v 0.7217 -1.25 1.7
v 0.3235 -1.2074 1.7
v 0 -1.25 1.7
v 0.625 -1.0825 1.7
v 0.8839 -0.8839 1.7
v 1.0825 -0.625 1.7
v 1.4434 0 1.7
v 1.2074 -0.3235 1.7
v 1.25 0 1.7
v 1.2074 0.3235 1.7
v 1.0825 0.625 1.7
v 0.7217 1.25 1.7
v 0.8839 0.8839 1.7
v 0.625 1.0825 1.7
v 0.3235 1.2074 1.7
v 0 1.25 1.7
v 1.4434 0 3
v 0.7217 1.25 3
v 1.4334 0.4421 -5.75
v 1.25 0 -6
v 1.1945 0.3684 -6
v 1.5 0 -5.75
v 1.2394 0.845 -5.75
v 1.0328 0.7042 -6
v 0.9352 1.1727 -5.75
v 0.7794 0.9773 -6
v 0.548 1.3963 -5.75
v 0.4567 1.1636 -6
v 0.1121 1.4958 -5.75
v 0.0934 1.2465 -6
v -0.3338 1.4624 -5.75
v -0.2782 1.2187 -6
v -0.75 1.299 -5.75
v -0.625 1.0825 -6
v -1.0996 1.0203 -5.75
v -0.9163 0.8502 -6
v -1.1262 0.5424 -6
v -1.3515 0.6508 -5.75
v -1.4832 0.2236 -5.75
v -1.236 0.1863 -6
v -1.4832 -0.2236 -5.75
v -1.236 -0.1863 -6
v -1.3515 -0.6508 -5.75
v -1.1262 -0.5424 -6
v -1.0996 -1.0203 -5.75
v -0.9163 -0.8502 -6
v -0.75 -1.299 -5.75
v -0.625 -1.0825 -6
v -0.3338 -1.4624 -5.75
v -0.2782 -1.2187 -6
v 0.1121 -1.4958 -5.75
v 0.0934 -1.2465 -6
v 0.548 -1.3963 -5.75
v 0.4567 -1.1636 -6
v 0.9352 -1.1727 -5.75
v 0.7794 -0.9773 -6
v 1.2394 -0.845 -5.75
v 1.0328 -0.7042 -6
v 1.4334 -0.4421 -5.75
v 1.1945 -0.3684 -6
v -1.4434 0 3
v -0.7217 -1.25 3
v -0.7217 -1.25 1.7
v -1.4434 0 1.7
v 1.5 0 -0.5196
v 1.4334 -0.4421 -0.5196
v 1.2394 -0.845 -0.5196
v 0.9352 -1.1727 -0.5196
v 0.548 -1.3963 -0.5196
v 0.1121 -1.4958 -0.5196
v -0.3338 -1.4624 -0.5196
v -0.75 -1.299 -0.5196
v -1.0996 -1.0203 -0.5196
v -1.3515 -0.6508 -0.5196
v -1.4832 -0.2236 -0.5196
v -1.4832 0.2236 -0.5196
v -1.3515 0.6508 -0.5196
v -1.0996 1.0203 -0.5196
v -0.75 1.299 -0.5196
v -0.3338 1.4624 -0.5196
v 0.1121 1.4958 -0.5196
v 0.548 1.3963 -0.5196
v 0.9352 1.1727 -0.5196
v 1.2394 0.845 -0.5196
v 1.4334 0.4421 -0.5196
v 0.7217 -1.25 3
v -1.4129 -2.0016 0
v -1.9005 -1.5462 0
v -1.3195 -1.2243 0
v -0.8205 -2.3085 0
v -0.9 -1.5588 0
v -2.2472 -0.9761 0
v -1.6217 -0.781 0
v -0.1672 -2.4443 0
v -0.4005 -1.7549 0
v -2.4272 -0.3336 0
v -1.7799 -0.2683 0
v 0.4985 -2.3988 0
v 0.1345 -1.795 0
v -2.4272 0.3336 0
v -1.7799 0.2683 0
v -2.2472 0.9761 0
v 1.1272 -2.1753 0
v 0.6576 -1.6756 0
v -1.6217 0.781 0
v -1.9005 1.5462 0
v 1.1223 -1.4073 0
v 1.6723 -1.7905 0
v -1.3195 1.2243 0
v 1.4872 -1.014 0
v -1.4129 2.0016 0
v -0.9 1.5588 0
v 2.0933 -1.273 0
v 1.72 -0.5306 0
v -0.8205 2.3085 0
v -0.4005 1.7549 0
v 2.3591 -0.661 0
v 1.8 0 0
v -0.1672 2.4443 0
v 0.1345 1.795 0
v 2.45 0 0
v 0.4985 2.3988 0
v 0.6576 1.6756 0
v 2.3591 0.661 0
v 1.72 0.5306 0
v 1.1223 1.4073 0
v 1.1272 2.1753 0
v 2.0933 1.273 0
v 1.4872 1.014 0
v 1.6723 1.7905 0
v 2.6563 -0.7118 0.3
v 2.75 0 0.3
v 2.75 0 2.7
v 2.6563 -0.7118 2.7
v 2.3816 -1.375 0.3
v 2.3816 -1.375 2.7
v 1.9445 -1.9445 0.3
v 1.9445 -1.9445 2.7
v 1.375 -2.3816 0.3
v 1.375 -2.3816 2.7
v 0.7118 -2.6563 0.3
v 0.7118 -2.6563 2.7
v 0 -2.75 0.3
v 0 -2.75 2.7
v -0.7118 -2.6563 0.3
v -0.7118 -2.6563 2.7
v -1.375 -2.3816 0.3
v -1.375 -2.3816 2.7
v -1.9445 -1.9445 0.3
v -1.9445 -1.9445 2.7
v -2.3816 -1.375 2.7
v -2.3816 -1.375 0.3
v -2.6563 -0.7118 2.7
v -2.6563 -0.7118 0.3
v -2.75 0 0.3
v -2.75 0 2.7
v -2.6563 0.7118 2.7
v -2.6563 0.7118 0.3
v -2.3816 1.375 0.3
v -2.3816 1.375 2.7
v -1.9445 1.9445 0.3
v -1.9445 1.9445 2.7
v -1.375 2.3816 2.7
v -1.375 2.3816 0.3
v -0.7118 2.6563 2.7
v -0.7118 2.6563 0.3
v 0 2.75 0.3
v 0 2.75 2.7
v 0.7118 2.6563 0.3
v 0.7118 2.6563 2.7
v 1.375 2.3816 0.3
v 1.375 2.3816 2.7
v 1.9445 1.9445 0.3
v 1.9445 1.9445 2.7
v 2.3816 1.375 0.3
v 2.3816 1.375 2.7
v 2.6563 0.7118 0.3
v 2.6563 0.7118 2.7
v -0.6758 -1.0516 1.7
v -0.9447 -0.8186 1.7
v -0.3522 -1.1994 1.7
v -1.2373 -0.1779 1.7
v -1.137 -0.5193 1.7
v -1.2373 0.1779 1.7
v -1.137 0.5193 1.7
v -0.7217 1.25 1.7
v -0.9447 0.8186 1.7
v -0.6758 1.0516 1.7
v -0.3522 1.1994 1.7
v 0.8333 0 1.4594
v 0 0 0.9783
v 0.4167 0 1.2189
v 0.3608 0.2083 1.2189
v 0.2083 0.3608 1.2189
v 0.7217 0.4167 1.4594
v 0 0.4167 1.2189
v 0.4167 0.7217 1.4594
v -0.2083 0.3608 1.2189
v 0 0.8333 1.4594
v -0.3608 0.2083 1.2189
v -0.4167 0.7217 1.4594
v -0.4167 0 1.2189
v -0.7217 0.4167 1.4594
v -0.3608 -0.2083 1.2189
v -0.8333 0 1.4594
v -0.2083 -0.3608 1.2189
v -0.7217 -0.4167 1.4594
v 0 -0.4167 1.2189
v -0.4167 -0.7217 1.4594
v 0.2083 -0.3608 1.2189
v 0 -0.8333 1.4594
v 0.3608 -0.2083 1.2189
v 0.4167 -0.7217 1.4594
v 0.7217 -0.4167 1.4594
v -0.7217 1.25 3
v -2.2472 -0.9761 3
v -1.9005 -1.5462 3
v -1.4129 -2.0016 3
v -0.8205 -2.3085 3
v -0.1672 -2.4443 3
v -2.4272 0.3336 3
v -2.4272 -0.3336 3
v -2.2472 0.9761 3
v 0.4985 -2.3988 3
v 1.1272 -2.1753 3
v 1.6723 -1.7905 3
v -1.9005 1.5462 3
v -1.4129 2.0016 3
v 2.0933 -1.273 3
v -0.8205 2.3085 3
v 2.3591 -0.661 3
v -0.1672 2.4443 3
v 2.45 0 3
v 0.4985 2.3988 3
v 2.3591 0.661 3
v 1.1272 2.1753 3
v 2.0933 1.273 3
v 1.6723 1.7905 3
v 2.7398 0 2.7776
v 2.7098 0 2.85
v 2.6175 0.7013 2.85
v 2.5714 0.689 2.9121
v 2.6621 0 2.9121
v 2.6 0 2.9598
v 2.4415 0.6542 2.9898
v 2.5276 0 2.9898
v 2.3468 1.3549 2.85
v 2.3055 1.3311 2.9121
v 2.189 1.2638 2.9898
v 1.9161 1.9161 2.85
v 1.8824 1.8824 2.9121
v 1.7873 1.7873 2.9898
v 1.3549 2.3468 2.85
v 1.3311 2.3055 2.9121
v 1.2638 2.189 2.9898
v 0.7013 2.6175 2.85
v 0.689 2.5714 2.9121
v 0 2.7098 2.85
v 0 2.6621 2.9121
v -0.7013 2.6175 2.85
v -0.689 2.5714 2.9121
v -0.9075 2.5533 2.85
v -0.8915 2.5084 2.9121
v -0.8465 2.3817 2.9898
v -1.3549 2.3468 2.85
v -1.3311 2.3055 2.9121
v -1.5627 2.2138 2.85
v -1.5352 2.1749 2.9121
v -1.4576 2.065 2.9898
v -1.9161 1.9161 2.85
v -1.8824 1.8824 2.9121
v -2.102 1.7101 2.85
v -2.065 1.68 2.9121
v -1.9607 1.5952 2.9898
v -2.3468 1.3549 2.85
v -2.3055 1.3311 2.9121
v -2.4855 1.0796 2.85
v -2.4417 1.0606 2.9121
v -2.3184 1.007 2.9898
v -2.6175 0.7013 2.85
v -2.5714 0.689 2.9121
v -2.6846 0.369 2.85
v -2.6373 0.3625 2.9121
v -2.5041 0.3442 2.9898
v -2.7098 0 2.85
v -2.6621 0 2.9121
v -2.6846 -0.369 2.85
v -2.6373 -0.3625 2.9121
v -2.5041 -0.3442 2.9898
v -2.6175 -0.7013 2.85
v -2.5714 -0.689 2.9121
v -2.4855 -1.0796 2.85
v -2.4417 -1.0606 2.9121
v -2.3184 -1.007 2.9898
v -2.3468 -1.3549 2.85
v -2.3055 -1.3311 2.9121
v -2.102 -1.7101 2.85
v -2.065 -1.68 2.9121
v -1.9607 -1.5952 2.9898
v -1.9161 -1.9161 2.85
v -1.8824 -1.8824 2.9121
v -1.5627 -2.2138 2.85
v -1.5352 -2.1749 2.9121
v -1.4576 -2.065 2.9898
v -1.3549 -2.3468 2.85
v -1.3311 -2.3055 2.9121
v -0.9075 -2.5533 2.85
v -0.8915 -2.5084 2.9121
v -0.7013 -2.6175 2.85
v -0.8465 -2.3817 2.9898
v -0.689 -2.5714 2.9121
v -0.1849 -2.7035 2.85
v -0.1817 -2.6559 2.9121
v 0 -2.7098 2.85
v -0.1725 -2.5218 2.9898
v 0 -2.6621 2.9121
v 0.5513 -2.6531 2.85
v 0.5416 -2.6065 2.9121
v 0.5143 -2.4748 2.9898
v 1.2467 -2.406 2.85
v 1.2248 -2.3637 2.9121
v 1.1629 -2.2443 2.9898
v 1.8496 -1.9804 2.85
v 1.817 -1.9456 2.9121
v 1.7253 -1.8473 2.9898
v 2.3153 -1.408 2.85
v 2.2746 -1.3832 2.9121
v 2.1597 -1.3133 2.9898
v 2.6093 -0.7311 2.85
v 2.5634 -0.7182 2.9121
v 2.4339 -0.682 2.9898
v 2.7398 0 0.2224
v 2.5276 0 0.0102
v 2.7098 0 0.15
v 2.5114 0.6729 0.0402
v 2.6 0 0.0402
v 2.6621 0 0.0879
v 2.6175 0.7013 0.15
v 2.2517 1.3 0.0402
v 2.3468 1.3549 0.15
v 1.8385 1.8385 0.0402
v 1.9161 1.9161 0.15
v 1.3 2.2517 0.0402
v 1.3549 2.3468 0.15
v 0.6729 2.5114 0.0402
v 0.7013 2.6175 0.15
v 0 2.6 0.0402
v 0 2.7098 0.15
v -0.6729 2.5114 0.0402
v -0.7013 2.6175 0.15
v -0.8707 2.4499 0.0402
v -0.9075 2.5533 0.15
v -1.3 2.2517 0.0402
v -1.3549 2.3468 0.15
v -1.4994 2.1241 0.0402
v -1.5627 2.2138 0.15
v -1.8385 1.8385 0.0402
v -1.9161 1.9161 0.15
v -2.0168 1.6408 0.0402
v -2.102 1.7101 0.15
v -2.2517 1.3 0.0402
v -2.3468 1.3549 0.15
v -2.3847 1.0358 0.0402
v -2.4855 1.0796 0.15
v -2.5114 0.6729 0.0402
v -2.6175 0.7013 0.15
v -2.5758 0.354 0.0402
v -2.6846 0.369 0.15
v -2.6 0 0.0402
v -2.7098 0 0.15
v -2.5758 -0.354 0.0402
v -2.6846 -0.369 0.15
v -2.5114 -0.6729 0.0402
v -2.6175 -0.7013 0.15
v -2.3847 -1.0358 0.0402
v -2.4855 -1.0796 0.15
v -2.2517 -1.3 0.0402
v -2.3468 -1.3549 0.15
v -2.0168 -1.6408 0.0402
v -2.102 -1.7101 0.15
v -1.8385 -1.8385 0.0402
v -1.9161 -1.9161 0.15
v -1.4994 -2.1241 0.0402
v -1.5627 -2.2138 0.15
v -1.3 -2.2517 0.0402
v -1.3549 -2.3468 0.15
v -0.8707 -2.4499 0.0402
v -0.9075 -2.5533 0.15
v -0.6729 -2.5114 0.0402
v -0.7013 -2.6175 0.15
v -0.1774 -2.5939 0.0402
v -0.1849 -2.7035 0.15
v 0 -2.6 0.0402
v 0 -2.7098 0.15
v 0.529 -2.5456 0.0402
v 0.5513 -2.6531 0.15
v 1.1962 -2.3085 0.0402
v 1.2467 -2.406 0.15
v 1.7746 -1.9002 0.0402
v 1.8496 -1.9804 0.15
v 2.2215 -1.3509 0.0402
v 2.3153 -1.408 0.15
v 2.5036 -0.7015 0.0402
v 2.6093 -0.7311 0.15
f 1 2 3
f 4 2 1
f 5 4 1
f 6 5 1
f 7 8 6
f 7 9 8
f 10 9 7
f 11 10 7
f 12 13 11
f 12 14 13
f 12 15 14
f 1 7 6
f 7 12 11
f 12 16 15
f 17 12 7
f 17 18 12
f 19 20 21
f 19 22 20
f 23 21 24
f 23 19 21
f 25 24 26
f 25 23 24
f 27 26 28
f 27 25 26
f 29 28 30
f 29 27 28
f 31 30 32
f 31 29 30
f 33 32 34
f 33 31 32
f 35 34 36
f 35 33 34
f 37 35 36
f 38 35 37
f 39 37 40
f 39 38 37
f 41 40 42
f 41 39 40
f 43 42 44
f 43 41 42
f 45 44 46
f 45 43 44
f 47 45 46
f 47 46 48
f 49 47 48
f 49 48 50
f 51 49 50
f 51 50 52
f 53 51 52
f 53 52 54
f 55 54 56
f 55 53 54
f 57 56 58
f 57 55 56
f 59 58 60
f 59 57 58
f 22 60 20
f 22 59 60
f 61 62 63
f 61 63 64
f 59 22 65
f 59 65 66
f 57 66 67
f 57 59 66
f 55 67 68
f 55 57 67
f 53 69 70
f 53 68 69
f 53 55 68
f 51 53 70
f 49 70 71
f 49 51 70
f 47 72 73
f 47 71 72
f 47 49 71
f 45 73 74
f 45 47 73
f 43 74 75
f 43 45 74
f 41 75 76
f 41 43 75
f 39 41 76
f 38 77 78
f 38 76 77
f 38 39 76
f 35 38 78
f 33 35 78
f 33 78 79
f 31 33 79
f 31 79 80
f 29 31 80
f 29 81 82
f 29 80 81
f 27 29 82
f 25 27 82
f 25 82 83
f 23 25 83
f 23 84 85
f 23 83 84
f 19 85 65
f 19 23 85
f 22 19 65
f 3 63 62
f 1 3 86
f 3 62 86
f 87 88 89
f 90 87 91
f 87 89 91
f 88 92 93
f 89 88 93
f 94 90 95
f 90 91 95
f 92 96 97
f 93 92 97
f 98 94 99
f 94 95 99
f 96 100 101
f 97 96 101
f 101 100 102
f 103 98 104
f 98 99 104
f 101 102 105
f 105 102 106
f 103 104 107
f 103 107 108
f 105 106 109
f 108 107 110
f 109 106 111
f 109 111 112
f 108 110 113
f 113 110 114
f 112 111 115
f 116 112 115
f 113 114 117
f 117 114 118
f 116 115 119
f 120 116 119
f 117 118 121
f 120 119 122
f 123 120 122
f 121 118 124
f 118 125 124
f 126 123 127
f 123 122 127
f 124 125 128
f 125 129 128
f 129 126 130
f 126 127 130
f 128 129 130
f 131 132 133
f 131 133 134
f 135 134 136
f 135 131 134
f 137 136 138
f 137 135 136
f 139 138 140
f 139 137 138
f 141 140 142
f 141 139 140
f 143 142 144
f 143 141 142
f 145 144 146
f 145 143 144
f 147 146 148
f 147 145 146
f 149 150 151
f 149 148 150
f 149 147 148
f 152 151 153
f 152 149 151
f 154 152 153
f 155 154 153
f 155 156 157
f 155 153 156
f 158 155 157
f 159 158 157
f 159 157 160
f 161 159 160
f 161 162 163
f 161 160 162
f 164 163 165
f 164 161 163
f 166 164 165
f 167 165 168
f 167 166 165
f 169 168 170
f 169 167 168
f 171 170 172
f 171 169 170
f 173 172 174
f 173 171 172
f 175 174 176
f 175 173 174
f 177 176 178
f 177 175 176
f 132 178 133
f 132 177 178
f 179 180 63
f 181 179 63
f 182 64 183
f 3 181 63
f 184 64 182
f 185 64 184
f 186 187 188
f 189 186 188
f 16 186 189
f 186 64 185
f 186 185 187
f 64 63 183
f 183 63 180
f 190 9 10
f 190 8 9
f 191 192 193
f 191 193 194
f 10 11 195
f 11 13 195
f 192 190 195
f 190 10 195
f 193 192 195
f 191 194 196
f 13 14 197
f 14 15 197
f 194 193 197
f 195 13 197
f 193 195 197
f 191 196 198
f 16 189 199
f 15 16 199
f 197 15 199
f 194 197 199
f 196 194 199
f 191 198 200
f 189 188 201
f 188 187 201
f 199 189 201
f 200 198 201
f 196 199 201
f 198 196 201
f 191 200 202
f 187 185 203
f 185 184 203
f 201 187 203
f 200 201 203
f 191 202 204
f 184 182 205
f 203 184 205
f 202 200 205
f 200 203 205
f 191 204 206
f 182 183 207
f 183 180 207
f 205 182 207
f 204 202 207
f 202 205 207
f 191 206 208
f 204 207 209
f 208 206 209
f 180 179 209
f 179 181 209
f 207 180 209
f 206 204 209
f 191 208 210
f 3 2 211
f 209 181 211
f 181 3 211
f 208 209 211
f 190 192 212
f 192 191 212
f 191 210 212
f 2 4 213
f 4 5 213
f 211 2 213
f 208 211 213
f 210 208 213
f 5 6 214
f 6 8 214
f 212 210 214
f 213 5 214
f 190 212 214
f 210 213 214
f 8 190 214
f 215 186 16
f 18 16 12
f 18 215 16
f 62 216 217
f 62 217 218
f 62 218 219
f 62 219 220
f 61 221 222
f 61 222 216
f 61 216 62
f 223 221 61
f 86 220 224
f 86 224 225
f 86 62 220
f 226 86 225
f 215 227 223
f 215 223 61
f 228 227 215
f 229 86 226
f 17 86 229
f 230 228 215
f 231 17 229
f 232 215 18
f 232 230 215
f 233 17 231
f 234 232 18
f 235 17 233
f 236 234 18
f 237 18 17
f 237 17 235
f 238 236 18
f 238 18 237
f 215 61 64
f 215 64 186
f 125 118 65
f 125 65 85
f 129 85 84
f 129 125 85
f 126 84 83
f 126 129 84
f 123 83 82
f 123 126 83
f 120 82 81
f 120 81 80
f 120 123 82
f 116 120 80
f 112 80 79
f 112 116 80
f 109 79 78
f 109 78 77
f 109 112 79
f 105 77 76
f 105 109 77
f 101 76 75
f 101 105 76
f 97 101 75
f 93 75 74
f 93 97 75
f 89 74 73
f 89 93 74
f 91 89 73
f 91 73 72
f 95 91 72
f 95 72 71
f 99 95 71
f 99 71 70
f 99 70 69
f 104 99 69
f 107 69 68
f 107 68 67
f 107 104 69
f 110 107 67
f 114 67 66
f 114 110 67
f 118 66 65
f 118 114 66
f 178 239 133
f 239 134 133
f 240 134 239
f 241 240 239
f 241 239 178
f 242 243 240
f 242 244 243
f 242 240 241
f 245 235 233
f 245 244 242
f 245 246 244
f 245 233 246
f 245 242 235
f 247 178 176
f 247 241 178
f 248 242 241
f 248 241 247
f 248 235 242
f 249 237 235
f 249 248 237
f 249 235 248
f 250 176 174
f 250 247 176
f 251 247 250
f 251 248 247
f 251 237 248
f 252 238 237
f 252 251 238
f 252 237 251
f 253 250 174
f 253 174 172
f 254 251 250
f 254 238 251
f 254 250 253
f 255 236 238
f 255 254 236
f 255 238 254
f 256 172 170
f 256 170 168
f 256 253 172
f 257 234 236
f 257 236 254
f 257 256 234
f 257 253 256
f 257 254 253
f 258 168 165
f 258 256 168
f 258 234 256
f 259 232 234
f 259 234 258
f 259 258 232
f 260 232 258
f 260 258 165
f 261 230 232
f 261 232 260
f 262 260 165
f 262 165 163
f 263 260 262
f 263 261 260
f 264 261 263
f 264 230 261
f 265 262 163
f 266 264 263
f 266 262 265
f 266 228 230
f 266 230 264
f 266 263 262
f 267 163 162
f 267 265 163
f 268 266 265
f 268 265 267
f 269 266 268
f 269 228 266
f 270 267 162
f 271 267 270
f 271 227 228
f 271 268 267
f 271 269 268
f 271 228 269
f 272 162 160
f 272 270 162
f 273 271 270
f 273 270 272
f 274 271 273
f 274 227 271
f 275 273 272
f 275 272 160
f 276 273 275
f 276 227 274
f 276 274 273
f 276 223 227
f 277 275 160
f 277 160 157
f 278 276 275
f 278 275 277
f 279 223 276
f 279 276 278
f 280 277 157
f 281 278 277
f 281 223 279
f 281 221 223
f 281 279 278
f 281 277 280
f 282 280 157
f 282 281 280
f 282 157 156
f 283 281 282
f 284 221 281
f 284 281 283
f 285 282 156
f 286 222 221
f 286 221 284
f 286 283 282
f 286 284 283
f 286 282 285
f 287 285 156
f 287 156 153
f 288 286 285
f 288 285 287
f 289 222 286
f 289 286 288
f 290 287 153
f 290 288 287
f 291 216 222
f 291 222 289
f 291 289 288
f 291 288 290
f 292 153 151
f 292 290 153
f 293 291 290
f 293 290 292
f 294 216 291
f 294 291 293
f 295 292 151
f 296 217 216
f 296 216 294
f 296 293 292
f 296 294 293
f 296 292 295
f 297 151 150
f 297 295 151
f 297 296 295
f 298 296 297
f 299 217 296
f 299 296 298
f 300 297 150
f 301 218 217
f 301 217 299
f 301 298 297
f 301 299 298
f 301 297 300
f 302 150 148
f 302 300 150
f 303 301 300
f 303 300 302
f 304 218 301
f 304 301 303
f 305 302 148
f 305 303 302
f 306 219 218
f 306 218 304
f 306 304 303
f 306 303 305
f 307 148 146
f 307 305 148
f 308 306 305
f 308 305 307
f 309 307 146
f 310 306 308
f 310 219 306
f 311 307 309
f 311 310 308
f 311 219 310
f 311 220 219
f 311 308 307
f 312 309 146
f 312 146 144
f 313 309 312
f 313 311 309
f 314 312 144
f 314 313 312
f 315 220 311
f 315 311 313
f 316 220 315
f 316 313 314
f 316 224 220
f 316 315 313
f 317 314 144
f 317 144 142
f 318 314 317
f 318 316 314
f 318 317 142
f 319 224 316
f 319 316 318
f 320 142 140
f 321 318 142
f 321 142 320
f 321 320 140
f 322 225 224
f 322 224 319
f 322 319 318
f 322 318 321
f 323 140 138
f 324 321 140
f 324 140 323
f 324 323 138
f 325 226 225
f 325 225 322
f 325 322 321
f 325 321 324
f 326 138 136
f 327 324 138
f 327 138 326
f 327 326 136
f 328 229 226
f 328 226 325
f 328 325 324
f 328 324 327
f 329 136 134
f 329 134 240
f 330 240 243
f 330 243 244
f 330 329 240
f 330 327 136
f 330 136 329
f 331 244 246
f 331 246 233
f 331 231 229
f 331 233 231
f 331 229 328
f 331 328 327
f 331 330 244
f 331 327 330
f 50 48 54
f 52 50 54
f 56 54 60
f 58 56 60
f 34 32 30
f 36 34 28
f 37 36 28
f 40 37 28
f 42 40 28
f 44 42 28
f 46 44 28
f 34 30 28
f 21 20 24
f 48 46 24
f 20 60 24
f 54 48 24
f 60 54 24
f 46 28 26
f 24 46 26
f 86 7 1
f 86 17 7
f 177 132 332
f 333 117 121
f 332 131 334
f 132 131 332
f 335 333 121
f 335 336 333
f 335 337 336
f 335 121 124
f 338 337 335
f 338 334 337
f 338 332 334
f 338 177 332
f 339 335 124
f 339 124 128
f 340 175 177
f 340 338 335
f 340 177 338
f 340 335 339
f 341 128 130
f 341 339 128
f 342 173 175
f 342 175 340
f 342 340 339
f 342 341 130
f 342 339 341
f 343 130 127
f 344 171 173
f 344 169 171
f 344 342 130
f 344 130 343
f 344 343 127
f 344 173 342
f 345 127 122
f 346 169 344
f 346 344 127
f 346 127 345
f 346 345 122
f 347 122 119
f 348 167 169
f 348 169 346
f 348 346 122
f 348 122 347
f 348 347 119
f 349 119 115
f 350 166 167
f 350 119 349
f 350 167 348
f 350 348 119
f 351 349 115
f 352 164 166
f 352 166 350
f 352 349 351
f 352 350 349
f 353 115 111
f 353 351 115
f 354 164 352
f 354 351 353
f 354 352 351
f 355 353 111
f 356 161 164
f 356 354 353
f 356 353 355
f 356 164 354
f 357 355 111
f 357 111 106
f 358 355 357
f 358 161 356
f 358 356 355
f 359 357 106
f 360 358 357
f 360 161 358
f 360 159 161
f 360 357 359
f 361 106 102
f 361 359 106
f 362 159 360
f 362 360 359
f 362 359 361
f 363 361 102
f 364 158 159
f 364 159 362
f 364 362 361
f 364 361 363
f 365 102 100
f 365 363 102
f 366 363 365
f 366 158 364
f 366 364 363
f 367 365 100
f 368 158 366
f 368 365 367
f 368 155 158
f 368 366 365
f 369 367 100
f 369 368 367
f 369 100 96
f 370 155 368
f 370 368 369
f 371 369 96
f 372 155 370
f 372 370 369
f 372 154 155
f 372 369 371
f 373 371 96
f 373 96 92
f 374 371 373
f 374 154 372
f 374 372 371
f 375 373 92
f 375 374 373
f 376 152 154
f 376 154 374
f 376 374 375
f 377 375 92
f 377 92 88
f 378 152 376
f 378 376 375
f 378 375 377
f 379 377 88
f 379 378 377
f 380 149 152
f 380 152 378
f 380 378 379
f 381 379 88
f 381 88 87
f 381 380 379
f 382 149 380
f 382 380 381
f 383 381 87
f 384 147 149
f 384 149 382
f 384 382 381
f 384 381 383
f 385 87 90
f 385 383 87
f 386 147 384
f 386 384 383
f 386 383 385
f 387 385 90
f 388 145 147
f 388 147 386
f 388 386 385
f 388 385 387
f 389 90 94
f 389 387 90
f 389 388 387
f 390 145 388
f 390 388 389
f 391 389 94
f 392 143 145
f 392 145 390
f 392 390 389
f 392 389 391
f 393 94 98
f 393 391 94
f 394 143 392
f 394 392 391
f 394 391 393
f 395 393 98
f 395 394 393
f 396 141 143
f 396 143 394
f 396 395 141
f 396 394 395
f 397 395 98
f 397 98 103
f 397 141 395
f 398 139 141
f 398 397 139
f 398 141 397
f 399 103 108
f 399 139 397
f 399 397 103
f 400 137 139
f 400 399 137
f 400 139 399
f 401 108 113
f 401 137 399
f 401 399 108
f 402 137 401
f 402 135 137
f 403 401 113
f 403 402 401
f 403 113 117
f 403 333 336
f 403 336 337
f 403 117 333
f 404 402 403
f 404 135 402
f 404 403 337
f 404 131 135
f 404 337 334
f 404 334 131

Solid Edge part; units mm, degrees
sketch "Sketch1" plane through (0, 0, 0) normal (0, -1, 0) x (1, 0, 0)
  line L0 (2.75, 3) -> (2.75, 0)
  line L1 (2.75, 0) -> (1.8, 0)
  line L2 (1.8, 0) -> (1.5, -0.5196)
  line L3 (1.5, -0.5196) -> (1.5, -6)
  line L4 (1.5, -6) -> (0, -6)
  line L5 (1.25, 1.7) -> (0, 0.9783)
  line L6 (1.25, 3) -> (1.25, 1.7)
  line L7 (2.75, 3) -> (1.25, 3)
  dimension "D1" = 1.3
  dimension "D2" = 6
  dimension "D3" = 3
revolve "RevolvedProtrusion1" add sketch "Sketch1" angle 360 about axis through (0, 0, -6) along (0, 0, 1)
cosmetic_thread "Thread1" size "M3"
chamfer "Chamfer_1" distance 0.25 angle 45 1 edges at (-1.5, 0, -6)
fillet "Round_1" radius 0.3 2 edges at (-2.75, 0, 0) (-2.75, 0, 3)
sketch "Sketch2" plane through (0, 0, 3) normal (0, 0, 1) x (0, 1, 0)
  line L0 (-1.25, 0.7217) -> (-1.25, -0.7217)
  line L1 (0, -1.4434) -> (-1.25, -0.7217)
  line L2 (1.25, -0.7217) -> (0, -1.4434)
  line L3 (1.25, 0.7217) -> (1.25, -0.7217)
  line L4 (0, 1.4434) -> (1.25, 0.7217)
  line L5 (-1.25, 0.7217) -> (0, 1.4434)
extrude "Cutout1" cut sketch "Sketch2" against normal up to vertex (1.3 mm away)
properties material "Galvanized steel"
